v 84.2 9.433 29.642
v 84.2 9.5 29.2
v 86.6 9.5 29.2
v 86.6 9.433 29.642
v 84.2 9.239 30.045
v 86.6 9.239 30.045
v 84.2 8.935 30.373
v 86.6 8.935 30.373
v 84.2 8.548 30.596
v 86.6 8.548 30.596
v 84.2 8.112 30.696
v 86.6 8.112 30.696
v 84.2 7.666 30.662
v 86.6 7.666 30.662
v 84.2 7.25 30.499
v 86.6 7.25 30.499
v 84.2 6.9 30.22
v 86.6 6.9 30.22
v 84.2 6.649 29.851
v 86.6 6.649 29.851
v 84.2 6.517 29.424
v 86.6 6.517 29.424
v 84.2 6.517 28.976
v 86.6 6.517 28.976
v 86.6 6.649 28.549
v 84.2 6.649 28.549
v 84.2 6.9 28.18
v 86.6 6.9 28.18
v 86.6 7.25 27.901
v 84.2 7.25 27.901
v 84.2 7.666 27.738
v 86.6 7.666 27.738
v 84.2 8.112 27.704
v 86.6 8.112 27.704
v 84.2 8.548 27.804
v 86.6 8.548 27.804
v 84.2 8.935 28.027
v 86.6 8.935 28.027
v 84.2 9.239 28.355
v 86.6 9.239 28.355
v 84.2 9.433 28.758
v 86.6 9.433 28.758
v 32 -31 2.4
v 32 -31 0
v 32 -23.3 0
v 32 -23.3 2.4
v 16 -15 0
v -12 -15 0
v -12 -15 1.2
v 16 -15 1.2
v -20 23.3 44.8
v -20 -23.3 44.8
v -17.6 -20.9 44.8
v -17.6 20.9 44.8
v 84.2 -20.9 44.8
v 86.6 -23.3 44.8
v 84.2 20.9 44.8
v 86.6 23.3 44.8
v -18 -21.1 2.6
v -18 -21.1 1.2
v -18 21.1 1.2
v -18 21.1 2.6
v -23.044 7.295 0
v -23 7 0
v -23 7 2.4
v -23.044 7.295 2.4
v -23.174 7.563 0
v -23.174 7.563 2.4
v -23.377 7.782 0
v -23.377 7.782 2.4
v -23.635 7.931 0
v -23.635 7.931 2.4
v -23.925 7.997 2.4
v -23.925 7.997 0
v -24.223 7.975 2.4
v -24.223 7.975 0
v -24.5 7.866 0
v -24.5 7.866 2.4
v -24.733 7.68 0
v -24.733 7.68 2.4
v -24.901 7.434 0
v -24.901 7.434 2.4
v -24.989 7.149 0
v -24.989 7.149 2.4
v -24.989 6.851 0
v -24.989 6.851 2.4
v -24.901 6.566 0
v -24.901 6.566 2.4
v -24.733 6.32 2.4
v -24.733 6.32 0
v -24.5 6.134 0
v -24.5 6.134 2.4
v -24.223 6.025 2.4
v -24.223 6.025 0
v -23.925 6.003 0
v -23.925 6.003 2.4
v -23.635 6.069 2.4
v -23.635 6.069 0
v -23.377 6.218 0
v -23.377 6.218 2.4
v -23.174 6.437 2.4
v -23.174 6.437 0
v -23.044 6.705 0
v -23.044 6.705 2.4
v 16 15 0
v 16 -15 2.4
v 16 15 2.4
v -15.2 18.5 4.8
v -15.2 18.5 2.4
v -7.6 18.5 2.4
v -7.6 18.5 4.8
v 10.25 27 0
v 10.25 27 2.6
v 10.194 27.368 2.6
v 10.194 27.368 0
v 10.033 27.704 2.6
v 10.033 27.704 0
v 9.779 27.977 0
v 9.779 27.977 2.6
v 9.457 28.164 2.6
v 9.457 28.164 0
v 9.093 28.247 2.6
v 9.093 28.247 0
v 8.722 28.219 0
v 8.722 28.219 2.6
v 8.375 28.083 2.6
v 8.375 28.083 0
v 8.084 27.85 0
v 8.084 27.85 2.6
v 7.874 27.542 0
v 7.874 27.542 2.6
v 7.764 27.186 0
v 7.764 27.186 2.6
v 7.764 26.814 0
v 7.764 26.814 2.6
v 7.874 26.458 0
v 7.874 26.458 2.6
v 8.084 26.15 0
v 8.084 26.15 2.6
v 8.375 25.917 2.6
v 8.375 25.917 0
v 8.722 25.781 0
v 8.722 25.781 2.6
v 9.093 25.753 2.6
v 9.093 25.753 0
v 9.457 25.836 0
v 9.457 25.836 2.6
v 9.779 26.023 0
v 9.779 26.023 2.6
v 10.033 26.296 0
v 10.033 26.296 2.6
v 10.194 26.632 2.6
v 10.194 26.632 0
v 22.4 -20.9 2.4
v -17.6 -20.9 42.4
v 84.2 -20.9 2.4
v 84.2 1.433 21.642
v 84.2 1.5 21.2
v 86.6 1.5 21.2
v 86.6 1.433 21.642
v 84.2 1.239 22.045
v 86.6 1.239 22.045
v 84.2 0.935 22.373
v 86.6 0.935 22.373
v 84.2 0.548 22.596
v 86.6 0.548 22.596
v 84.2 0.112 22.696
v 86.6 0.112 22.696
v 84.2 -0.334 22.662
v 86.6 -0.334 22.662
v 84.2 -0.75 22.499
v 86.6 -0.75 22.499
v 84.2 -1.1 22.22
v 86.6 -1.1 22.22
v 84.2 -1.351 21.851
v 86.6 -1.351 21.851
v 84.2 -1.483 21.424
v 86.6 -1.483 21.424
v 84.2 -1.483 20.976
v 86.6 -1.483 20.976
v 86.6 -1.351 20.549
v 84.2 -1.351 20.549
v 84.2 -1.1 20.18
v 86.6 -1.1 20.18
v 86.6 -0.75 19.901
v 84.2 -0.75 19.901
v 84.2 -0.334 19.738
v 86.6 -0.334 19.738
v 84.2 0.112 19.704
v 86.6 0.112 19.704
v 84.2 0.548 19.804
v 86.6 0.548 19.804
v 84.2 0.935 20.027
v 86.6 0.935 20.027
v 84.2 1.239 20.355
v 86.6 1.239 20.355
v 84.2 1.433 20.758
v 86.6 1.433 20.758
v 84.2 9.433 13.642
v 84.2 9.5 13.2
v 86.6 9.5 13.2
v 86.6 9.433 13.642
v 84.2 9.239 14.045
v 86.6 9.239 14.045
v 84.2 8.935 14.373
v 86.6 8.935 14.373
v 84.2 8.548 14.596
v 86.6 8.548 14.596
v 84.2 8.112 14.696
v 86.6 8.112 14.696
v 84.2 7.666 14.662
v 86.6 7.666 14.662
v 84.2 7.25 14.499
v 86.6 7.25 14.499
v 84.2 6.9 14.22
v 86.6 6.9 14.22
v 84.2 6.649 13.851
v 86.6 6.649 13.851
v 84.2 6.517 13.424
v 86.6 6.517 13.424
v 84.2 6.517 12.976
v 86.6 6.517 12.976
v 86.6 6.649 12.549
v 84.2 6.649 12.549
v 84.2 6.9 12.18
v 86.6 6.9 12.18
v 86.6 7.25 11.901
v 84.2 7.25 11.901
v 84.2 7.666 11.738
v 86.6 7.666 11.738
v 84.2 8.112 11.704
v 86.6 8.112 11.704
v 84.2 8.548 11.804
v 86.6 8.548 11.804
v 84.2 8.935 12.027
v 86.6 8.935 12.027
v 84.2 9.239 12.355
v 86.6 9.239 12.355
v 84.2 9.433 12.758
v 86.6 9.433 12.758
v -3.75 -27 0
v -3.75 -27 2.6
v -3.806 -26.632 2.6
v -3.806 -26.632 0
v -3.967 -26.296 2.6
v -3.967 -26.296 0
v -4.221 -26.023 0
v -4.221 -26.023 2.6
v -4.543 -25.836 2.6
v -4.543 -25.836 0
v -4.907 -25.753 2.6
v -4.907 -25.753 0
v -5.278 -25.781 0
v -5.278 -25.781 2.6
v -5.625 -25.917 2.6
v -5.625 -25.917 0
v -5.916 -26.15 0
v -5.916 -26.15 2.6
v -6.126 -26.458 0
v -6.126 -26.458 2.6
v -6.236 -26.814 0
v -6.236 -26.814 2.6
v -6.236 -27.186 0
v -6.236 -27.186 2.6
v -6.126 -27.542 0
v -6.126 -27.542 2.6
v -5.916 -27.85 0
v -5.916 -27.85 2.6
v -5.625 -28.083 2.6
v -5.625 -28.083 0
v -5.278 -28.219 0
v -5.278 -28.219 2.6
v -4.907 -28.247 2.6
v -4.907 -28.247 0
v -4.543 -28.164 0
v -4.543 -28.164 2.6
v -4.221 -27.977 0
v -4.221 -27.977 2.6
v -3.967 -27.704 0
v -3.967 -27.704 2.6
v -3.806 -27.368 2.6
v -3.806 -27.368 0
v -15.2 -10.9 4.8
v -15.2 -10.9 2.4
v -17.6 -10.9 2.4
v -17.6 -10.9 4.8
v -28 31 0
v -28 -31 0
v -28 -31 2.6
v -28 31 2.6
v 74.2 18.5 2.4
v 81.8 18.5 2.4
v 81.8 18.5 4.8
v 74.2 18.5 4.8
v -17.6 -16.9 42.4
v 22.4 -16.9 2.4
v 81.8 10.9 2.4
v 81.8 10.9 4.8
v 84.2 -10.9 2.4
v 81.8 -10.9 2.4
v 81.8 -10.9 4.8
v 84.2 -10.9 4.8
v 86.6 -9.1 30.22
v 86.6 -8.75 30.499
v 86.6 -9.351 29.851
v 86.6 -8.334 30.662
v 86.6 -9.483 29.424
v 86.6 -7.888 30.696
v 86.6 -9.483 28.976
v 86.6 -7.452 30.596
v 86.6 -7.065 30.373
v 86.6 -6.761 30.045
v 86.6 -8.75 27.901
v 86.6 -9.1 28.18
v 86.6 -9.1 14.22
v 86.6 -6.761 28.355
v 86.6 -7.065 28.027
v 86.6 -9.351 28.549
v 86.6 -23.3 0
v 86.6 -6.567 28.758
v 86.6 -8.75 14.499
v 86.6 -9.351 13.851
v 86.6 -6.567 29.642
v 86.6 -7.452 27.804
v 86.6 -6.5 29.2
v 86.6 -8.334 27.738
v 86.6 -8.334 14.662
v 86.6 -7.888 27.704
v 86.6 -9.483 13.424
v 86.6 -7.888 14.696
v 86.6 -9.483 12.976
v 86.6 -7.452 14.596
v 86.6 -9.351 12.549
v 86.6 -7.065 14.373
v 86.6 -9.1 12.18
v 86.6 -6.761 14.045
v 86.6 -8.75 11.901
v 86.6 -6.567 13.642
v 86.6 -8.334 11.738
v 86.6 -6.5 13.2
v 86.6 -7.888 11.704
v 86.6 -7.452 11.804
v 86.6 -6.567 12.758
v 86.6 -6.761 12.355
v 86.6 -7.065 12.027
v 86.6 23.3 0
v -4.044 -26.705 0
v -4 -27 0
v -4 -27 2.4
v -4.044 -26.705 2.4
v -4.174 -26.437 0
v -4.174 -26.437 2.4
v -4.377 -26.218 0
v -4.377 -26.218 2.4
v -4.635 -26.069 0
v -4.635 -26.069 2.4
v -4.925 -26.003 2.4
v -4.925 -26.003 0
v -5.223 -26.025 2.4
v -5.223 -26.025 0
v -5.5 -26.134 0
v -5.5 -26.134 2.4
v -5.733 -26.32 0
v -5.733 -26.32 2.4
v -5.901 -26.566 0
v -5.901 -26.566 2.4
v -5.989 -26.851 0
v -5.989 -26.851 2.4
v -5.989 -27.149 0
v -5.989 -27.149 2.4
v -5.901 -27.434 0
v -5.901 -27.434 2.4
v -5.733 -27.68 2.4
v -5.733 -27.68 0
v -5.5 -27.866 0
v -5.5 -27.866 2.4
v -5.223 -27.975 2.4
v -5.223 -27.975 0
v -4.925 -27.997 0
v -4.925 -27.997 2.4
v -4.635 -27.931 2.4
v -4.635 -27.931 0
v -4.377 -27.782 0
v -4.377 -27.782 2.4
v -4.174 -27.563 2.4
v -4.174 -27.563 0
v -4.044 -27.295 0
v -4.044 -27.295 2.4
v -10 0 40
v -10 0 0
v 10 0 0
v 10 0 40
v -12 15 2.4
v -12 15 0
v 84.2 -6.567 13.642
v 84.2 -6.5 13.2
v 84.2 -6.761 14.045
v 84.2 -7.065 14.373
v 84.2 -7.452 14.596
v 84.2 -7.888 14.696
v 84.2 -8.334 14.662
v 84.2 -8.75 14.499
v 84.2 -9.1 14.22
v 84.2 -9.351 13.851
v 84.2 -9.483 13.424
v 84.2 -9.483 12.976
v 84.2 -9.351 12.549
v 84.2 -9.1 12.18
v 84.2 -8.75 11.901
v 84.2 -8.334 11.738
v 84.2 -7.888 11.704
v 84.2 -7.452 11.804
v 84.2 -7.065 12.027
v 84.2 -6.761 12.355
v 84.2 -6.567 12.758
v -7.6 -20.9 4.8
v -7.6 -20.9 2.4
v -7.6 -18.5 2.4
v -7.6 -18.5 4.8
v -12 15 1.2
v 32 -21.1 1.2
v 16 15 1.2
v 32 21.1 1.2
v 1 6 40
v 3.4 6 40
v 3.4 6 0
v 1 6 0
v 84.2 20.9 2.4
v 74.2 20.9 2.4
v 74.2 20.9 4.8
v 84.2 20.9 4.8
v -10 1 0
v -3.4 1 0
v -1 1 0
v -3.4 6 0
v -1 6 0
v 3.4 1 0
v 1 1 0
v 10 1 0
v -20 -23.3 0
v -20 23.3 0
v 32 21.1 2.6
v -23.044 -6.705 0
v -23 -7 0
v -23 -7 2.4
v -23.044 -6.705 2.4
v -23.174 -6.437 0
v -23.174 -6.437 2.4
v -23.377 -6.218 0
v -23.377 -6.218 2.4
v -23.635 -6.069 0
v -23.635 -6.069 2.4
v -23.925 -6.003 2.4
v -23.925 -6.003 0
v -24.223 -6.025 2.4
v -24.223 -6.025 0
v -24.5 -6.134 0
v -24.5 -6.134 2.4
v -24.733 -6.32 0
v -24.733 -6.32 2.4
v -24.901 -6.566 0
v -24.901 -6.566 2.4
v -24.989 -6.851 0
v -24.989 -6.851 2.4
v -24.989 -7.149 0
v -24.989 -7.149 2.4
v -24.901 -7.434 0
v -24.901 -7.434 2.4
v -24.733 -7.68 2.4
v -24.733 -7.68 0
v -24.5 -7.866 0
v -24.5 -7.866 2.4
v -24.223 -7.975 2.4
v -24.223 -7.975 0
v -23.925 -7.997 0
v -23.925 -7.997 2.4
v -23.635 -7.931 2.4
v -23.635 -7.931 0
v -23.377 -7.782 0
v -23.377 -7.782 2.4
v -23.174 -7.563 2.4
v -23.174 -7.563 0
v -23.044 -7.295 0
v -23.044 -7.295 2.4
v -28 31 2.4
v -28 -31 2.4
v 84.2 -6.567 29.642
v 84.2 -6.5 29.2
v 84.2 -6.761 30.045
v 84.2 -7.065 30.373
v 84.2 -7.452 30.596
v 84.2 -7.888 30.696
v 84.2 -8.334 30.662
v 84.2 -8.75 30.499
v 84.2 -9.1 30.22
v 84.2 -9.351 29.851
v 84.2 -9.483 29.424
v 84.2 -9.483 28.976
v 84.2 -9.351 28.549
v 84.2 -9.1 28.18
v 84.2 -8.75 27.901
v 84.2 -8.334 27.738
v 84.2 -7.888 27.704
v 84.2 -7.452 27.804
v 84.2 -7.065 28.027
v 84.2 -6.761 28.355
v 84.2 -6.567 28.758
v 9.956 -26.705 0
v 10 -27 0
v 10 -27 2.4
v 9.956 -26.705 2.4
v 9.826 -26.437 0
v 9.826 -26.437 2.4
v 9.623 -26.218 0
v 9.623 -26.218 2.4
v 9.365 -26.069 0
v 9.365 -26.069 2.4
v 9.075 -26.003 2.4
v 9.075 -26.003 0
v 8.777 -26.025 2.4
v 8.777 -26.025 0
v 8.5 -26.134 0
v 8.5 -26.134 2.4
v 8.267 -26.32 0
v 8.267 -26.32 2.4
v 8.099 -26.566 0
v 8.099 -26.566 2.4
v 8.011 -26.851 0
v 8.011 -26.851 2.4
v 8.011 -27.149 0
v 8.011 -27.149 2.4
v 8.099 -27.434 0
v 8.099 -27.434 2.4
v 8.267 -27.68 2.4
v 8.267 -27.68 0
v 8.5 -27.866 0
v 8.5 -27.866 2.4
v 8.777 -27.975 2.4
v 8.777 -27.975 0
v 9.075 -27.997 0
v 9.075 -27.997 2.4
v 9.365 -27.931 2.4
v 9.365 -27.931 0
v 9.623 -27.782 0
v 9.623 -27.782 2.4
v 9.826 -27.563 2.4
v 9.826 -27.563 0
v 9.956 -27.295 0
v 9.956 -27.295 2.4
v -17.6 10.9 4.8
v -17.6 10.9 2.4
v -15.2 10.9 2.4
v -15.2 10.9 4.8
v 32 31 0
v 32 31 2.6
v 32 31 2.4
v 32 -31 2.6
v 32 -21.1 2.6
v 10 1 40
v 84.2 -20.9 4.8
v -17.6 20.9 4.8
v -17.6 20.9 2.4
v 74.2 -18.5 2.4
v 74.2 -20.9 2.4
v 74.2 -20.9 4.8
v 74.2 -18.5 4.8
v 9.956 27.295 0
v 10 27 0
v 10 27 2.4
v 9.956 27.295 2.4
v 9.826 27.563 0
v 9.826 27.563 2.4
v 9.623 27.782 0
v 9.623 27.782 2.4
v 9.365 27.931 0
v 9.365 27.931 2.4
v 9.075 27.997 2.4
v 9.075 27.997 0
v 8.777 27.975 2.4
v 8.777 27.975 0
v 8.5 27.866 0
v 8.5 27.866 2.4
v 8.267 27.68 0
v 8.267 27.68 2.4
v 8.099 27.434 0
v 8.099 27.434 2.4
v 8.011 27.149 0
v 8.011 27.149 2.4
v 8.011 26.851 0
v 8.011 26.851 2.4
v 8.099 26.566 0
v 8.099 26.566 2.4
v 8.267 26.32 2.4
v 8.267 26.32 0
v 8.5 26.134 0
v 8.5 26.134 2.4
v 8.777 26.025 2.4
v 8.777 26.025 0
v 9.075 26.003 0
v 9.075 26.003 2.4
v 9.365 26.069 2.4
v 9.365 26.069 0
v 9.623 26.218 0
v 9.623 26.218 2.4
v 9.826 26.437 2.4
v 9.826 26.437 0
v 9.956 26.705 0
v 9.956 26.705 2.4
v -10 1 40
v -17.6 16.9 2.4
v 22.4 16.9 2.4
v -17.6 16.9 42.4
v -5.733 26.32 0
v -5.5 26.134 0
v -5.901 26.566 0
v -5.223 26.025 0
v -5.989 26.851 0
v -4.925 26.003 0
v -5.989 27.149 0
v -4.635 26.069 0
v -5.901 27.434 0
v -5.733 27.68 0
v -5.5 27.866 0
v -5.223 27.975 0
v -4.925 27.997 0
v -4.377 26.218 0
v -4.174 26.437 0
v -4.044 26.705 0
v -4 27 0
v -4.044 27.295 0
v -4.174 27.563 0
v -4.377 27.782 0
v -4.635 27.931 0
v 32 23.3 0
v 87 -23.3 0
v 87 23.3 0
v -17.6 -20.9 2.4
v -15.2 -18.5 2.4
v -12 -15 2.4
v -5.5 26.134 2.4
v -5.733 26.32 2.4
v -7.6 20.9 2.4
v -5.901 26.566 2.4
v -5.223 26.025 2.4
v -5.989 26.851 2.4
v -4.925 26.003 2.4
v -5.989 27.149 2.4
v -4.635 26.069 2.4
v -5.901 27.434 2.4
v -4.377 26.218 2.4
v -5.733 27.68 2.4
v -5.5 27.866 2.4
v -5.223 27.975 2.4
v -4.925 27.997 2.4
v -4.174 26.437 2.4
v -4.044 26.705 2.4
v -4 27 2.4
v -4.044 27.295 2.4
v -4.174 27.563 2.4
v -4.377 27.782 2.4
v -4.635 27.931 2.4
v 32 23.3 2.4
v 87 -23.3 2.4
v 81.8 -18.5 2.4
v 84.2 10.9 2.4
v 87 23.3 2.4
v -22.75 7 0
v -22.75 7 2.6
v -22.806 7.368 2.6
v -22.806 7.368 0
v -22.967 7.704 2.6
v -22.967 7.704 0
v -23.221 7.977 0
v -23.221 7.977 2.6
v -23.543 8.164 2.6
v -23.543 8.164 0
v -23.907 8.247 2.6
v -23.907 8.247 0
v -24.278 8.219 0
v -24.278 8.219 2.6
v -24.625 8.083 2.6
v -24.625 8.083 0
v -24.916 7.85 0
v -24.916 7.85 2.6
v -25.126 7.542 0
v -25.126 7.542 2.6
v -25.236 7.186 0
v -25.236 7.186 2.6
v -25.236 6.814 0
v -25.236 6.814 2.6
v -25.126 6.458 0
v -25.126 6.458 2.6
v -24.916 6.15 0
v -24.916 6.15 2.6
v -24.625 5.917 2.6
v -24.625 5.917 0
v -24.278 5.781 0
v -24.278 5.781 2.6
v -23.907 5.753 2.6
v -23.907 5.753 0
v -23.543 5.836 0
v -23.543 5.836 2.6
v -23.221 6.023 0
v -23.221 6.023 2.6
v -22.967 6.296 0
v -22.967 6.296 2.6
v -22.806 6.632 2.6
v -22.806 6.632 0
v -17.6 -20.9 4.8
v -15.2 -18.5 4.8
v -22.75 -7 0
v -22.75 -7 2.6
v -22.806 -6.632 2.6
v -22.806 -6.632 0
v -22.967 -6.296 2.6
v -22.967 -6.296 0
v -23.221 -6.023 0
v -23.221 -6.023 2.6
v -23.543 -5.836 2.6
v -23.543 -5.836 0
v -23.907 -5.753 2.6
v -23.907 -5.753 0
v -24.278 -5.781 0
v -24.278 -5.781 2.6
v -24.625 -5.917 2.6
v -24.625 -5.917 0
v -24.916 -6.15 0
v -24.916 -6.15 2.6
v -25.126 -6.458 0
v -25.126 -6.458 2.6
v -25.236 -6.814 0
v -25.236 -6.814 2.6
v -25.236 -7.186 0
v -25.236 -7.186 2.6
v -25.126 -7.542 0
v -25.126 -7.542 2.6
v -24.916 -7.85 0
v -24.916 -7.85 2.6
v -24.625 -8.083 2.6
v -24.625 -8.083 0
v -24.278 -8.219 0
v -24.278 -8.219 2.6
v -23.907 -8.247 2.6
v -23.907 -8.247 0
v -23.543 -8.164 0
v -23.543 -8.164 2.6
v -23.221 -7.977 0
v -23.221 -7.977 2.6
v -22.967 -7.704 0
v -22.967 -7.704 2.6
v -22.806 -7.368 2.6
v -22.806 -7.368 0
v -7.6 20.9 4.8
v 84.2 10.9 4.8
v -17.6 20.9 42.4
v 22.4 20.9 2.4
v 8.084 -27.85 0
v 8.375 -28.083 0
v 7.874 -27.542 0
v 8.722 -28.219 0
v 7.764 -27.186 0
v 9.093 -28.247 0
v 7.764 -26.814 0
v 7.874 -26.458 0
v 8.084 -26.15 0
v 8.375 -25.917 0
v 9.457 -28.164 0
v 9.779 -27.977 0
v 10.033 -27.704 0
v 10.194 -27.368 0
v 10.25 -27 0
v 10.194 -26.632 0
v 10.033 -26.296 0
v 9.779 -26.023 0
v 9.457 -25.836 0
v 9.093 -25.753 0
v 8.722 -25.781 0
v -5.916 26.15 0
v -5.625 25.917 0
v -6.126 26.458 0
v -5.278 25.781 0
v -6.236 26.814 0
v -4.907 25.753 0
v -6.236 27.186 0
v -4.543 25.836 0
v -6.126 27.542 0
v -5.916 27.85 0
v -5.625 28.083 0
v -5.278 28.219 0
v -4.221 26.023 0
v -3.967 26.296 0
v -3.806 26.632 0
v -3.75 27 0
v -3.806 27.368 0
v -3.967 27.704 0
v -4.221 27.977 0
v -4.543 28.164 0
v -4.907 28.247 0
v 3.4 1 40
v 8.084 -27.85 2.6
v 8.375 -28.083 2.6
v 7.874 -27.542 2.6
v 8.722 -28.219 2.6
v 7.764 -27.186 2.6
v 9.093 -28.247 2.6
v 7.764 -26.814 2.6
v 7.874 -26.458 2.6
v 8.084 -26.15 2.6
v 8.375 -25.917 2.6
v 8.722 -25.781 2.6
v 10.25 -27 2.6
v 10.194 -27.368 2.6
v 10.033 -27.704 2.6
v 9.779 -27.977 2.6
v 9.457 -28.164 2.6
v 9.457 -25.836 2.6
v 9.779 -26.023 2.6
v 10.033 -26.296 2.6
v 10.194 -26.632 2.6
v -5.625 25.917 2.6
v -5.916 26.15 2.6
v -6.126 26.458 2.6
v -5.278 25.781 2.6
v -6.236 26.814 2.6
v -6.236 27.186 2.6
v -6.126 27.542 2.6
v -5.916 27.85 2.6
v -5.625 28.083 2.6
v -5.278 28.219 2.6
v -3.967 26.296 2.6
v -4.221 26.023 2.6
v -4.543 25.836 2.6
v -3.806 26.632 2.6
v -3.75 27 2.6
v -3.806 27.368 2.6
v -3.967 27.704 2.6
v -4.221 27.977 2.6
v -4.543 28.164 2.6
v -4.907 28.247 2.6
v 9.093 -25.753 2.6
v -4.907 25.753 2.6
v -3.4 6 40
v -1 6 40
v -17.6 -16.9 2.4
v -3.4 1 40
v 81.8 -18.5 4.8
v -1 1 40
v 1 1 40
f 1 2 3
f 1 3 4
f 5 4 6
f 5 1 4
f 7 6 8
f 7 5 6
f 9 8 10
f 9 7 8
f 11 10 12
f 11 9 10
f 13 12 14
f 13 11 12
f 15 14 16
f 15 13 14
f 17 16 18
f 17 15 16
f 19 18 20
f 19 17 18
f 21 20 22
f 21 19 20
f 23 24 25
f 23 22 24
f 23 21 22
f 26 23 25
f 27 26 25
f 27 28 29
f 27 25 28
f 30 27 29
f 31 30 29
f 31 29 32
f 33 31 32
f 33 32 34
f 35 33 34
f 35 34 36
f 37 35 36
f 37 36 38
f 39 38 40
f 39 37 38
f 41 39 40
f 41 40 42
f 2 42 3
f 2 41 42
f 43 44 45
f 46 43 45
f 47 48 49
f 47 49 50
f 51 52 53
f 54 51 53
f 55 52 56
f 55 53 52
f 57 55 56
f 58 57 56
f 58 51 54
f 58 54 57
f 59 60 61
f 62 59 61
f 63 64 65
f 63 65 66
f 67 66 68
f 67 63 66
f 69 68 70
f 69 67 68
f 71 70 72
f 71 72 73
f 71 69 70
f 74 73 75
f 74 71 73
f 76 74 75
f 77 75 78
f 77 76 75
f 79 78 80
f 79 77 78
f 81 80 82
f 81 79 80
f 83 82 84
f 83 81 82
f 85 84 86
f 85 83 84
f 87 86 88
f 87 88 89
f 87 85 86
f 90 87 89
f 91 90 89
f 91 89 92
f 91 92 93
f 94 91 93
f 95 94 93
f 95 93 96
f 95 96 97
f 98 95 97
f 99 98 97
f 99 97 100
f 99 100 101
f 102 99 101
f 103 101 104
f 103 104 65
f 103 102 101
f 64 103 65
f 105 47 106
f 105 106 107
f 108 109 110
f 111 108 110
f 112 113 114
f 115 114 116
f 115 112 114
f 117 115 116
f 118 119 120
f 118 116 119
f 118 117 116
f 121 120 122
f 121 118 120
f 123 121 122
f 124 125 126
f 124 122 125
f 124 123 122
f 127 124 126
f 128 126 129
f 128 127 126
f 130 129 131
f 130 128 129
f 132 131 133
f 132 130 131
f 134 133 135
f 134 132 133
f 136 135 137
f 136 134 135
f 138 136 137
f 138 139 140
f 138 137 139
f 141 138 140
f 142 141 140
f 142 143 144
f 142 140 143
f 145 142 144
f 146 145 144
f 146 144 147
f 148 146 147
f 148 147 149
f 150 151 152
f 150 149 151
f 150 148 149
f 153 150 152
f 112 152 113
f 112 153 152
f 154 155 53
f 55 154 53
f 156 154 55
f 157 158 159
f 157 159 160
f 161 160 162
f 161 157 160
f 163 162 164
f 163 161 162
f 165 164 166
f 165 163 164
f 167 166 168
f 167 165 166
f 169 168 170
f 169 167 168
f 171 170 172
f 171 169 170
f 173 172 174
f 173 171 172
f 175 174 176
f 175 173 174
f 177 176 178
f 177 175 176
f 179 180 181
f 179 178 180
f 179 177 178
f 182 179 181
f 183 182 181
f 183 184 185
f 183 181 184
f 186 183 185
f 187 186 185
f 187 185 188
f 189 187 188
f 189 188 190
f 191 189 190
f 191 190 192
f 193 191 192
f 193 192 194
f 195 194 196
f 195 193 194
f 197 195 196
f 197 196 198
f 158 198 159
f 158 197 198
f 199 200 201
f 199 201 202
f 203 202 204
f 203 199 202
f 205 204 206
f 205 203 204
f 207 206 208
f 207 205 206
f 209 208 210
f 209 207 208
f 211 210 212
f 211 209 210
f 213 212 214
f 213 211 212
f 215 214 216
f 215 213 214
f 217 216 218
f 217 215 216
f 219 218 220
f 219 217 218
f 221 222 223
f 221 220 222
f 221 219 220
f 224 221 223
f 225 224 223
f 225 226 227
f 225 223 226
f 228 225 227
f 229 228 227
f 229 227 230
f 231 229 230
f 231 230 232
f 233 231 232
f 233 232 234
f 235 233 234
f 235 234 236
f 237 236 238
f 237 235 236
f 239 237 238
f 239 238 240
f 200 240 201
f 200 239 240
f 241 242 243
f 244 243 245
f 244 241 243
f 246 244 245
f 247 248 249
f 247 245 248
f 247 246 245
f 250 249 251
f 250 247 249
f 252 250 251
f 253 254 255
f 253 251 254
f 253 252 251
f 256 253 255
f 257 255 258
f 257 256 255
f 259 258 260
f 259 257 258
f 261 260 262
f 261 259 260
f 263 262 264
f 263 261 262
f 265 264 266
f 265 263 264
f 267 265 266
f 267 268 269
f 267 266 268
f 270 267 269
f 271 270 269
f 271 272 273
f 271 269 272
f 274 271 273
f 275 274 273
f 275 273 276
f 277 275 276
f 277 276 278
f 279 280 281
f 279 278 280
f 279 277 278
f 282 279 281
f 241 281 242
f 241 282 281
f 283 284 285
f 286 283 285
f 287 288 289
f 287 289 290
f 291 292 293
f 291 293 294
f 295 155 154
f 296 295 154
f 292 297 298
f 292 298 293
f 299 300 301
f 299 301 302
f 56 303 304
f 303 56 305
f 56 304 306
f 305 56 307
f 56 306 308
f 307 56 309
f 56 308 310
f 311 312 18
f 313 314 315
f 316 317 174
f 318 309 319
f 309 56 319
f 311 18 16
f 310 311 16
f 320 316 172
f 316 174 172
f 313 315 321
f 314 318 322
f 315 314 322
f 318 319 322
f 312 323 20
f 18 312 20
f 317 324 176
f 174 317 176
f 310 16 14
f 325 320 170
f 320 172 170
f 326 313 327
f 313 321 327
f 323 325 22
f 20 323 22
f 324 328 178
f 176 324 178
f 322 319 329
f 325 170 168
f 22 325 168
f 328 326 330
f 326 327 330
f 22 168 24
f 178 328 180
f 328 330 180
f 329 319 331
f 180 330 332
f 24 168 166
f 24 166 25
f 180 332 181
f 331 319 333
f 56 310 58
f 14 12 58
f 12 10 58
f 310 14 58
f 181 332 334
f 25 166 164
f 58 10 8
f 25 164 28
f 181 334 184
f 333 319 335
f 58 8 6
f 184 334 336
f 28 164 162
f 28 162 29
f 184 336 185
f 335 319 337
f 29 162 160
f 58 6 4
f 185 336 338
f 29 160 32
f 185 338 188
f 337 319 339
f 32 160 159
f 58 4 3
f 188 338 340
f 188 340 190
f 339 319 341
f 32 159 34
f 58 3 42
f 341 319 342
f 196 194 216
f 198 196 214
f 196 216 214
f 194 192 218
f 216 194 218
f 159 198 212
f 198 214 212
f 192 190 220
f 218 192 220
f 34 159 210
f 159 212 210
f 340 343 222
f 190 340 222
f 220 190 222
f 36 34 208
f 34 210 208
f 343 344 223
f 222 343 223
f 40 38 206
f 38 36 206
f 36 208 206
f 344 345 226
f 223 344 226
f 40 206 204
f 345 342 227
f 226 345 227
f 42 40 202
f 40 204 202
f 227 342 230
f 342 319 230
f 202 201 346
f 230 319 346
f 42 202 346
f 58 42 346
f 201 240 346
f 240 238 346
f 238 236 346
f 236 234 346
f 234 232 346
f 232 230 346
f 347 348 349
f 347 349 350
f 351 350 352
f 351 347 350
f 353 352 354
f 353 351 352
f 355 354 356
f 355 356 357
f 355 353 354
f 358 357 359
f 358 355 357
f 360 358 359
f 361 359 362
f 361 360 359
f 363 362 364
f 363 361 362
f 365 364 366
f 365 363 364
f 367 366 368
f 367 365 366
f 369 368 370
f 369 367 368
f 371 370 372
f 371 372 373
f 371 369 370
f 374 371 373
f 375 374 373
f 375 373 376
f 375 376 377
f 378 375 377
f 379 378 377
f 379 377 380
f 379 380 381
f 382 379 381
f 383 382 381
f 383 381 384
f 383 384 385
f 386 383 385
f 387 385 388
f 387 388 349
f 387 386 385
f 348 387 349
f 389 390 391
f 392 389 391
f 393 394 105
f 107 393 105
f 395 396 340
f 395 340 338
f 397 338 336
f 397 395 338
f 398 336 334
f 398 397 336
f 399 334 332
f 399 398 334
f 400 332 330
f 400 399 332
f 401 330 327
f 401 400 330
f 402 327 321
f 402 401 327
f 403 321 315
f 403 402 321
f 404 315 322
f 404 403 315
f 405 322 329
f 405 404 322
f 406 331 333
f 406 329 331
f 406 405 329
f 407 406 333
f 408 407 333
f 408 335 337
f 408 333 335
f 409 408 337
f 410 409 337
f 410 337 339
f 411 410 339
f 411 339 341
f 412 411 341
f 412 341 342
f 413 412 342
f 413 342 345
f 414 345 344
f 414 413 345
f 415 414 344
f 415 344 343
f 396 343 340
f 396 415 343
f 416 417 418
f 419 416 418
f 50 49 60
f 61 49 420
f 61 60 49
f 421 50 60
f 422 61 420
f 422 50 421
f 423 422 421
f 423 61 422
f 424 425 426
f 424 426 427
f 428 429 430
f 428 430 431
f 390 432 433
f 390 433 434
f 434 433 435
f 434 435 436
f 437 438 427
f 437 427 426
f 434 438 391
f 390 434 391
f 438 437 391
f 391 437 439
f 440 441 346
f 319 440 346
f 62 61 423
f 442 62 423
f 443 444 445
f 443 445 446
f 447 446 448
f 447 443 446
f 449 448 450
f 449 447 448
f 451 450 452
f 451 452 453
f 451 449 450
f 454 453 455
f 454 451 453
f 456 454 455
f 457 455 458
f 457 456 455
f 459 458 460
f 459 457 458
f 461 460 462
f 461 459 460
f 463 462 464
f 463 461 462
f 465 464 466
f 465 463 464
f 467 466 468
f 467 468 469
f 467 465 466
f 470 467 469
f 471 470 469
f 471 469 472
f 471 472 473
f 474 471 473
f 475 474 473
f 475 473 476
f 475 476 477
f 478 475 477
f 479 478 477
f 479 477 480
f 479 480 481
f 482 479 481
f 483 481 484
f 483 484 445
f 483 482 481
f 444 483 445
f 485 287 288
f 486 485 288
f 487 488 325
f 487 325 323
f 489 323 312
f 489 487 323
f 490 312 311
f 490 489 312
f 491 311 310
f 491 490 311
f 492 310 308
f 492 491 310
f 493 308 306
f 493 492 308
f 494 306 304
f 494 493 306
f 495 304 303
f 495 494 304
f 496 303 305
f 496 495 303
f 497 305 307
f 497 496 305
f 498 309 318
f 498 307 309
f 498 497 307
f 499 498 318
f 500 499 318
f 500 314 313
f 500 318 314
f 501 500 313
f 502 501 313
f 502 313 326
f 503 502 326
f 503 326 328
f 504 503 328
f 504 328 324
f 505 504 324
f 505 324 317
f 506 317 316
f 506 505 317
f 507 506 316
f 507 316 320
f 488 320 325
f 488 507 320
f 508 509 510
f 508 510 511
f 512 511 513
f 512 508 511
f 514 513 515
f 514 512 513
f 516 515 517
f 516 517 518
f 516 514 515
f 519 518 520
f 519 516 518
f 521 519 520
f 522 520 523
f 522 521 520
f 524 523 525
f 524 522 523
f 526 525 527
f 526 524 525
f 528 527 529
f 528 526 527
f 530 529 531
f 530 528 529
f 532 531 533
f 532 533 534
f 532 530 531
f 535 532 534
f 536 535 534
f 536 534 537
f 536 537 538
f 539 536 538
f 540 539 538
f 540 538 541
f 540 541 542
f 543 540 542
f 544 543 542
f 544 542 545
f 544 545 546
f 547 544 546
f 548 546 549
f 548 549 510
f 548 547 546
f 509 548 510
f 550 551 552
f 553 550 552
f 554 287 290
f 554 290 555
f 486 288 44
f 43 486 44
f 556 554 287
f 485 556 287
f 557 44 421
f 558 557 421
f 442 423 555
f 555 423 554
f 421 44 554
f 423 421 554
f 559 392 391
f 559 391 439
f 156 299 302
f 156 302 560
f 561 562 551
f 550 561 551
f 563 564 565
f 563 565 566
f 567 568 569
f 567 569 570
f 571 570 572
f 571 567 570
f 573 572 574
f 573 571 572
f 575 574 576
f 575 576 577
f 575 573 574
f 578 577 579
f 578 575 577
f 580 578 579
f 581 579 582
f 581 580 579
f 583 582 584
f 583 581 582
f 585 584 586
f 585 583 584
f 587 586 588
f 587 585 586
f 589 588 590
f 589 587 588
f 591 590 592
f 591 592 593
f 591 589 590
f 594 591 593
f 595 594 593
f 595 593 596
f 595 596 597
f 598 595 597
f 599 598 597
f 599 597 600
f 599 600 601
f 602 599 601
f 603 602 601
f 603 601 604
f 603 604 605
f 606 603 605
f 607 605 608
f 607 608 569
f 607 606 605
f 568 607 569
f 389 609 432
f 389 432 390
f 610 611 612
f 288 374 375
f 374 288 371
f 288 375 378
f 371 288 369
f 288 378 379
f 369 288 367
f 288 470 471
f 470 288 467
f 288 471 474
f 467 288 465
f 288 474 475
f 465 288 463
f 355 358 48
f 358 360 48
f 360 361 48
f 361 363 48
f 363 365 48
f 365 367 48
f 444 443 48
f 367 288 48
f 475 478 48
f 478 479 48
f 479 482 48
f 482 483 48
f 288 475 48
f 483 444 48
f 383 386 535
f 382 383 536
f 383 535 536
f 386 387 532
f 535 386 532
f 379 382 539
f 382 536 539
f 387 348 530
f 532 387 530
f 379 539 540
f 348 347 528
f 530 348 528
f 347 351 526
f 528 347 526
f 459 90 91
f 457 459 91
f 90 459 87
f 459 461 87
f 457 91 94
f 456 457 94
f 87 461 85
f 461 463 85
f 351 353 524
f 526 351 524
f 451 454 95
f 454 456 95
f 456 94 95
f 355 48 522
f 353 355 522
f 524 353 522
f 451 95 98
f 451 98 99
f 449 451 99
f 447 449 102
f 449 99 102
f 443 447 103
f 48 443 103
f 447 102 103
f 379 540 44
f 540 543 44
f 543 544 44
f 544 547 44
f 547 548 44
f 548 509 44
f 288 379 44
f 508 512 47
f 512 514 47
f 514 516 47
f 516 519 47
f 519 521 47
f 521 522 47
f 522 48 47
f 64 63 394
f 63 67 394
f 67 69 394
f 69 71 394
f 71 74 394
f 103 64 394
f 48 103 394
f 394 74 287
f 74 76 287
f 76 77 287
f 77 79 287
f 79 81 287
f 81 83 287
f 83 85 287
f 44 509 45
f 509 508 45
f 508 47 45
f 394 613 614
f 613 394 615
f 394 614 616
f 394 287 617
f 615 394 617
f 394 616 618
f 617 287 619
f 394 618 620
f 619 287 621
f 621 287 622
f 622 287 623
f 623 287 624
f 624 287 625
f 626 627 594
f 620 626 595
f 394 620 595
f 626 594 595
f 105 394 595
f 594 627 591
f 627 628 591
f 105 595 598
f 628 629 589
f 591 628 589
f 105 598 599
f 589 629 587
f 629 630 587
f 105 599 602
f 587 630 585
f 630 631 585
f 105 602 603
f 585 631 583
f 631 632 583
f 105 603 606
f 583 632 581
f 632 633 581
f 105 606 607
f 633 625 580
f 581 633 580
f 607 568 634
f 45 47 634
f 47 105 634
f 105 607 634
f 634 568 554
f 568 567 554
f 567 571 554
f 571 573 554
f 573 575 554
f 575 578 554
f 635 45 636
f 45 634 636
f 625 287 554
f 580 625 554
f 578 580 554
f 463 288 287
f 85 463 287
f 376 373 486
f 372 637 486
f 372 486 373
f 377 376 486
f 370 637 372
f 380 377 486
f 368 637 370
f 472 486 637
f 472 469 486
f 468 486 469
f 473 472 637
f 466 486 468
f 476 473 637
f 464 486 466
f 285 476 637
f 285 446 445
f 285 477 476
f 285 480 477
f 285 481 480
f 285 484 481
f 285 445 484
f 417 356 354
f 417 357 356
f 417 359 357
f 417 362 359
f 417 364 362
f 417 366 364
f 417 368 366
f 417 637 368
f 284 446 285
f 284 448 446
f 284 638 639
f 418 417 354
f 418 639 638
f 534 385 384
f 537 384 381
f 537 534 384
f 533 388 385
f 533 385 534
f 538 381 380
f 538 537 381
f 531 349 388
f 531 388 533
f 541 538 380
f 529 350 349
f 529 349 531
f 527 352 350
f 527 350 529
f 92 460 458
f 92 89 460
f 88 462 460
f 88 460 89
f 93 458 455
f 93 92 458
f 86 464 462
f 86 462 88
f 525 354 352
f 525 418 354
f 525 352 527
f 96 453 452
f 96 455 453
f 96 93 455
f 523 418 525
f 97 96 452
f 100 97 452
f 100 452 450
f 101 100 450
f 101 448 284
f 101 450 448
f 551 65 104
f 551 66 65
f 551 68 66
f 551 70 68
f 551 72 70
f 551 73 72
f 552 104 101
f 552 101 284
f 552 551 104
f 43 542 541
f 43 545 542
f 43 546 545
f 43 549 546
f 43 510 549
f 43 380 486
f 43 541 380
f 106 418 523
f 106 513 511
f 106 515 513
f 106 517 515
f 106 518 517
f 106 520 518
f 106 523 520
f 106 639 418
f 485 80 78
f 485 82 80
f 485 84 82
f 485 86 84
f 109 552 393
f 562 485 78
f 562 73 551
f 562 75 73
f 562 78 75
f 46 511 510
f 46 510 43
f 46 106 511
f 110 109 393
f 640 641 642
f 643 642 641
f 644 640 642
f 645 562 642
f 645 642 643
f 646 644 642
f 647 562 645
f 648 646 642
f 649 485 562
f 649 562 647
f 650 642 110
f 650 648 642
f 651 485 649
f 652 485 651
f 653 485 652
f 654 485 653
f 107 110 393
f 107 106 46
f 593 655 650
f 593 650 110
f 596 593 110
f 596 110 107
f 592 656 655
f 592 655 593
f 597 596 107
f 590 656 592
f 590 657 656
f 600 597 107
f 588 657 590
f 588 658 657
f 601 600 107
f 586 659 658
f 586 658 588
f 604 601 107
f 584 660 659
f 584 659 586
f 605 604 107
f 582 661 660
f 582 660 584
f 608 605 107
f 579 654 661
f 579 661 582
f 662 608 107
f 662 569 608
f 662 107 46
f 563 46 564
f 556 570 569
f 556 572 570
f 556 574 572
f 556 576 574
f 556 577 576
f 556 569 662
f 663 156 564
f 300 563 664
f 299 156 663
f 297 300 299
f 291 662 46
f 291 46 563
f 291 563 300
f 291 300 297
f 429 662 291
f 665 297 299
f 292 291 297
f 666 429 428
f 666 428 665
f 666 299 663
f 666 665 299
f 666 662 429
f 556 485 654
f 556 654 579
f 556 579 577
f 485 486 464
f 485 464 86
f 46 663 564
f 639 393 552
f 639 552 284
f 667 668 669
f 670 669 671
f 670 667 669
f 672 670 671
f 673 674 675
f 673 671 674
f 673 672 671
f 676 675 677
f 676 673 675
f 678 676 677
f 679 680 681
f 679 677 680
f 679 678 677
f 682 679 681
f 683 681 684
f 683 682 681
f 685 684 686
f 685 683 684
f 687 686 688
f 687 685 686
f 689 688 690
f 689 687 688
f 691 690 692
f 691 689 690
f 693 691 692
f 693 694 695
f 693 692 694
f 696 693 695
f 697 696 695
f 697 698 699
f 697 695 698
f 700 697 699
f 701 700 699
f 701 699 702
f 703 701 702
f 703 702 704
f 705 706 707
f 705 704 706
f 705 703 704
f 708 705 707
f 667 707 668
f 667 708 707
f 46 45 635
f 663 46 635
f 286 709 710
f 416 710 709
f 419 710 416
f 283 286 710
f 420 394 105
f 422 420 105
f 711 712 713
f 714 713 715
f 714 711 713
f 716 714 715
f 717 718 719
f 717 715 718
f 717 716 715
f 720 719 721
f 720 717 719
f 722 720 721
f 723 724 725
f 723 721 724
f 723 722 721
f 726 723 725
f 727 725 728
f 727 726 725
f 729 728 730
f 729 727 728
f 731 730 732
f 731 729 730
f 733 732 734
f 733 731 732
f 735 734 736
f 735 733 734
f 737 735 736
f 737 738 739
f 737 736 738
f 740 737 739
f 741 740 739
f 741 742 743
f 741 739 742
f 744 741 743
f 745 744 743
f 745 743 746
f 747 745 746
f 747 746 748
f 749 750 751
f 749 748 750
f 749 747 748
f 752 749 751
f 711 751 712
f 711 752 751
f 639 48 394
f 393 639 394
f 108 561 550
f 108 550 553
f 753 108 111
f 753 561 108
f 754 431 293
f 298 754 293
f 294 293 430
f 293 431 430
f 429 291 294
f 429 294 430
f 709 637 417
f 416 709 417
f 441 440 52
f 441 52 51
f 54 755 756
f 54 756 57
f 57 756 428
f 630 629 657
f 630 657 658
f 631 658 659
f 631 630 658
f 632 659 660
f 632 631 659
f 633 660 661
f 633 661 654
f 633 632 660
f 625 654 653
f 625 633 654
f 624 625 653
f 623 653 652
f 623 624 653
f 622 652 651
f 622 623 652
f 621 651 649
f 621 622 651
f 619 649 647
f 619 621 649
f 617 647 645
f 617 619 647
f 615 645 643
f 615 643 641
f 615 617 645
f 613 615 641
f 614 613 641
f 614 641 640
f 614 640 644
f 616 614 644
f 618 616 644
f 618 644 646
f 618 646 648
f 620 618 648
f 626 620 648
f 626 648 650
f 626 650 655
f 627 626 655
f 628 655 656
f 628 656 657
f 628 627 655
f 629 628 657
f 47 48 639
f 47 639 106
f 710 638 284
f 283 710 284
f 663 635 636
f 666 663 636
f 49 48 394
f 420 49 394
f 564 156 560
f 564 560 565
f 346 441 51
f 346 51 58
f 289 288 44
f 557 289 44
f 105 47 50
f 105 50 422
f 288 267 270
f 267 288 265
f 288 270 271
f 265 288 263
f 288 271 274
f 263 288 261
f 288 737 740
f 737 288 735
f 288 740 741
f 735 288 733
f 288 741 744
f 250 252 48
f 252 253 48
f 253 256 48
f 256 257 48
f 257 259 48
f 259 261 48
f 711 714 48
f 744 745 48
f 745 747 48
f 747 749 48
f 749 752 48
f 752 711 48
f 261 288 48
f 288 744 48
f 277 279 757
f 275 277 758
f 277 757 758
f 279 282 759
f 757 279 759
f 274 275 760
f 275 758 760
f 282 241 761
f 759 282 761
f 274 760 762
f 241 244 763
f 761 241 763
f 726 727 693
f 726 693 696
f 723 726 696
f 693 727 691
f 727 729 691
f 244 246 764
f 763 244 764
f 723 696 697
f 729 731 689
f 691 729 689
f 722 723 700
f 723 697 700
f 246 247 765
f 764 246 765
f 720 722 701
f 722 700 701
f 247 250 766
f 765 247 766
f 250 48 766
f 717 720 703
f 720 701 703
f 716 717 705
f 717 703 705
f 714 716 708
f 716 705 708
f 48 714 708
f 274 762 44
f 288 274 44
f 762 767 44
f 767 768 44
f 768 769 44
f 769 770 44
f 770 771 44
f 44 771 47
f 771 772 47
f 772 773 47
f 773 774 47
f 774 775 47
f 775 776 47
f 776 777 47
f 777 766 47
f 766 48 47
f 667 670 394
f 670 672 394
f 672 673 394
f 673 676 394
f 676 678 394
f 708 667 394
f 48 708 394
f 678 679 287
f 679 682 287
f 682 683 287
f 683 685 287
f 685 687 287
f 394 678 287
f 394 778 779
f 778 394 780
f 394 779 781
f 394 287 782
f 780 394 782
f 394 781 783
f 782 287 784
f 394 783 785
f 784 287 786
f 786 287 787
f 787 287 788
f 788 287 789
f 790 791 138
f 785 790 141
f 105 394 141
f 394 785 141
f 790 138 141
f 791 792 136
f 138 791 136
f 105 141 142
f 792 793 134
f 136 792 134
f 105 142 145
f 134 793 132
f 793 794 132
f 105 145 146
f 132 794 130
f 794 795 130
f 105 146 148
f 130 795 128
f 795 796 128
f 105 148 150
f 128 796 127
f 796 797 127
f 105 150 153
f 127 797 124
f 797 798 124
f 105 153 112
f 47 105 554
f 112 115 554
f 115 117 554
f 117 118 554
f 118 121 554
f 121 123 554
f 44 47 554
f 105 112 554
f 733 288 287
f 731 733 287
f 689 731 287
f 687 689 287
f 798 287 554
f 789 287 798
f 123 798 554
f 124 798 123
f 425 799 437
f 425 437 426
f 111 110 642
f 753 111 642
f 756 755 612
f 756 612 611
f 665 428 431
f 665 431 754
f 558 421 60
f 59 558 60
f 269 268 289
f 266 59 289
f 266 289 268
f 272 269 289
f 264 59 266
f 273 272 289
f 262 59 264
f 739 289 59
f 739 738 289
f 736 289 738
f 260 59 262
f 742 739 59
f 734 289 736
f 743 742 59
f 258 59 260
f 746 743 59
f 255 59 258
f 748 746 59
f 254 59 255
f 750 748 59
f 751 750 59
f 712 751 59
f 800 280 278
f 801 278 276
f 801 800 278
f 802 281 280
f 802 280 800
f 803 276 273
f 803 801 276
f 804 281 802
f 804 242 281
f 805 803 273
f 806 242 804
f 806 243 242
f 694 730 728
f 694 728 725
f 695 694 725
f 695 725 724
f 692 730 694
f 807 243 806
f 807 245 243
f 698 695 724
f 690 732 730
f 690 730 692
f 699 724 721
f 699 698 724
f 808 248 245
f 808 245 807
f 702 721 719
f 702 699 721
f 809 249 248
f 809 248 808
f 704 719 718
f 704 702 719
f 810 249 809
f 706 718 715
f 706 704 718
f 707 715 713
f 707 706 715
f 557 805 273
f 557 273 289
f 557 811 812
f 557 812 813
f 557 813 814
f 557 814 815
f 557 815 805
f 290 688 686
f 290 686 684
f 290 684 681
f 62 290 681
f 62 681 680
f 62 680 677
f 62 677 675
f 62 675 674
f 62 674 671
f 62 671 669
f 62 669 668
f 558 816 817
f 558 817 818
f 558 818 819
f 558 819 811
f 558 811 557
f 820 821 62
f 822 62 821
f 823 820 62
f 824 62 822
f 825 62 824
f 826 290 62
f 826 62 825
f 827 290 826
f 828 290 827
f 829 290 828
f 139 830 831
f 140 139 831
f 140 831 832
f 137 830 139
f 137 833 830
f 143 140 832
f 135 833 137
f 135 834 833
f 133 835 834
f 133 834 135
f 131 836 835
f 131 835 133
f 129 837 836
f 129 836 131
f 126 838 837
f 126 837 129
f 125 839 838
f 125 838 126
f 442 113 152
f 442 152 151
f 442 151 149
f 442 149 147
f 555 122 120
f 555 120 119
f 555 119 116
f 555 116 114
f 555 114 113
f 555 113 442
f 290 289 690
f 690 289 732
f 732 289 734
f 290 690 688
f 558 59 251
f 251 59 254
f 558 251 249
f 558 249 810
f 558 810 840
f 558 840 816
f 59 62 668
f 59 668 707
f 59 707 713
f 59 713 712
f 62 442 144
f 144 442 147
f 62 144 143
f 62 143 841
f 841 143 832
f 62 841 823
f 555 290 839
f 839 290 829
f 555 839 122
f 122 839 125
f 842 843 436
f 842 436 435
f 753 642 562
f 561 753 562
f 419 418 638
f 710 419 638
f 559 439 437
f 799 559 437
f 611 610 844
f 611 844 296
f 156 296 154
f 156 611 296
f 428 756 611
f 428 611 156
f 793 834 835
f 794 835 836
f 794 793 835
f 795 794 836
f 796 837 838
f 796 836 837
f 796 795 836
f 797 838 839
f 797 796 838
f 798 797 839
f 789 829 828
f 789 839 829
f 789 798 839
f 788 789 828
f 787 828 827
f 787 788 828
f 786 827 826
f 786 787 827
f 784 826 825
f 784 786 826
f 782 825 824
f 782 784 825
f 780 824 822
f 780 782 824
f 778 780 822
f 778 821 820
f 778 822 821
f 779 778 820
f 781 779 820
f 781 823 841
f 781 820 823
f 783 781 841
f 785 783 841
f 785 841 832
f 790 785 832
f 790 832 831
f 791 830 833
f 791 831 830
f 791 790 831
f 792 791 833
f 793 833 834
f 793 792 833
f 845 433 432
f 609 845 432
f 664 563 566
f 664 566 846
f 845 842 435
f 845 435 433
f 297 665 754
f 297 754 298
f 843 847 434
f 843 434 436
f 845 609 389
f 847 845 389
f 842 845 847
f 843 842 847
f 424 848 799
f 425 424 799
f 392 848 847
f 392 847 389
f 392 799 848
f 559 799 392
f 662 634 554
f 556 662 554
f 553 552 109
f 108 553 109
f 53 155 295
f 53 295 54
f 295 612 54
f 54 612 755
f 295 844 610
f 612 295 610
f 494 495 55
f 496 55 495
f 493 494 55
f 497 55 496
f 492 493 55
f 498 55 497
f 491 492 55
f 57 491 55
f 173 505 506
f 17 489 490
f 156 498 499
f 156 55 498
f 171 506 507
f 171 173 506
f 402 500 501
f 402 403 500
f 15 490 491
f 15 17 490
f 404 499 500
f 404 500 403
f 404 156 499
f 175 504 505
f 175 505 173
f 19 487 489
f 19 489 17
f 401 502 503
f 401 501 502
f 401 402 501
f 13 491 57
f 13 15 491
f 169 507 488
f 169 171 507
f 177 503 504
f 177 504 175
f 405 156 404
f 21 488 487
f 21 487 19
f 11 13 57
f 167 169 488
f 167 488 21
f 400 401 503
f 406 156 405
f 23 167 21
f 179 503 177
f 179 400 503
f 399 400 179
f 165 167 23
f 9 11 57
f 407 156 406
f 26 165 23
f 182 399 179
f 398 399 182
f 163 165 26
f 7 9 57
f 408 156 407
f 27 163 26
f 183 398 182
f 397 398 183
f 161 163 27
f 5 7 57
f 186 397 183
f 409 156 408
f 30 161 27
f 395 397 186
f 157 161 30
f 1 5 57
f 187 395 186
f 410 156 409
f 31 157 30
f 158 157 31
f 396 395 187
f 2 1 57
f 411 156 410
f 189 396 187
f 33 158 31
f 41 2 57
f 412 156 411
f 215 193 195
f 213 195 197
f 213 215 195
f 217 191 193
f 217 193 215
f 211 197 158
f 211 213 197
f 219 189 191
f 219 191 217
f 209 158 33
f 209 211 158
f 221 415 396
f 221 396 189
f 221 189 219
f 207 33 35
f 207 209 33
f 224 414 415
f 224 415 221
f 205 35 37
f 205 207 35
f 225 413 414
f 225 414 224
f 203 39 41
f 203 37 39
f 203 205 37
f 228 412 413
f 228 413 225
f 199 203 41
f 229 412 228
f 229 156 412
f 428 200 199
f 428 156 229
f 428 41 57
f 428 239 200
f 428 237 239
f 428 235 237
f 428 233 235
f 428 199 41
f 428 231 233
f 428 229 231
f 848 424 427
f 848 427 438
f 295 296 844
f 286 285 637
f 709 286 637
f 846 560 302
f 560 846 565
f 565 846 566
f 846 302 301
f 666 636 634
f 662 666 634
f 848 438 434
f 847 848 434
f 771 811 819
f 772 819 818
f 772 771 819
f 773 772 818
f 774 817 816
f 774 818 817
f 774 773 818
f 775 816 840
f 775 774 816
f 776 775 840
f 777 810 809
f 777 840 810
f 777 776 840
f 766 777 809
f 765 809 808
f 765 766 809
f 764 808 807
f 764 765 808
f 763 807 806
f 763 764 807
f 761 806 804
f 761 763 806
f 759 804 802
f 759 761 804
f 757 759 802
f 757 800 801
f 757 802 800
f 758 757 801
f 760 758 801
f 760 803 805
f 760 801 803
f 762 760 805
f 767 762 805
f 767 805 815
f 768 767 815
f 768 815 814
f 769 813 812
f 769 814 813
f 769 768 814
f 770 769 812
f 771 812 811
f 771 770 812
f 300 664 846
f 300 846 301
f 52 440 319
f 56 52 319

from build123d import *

# Parameters (mm, degrees)
SKETCH_W             = 106.6
SKETCH_H             = 46.6
PAD_DEPTH            = 2.4
SKETCH001_W          = 106.6
SKETCH001_H          = 46.6
SKETCH001_W_2        = 101.8
SKETCH001_H_2        = 41.8
PAD001_DEPTH         = 44.8
PAD002_DEPTH         = 4
SKETCH003_R          = 1.5
POCKET_DEPTH         = 86.601
PAD003_DEPTH         = 40
SKETCH005_R          = 1
SKETCH005_W          = 28
SKETCH005_H          = 30
PAD005_DEPTH         = 2.4
PAD006_DEPTH         = 4.8
SKETCH007_W          = 60
SKETCH007_H          = 62
SKETCH007_R          = 1.25
SKETCH007_W_2        = 28
SKETCH007_H_2        = 30
PAD007_DEPTH         = 1.2
PAD008_DEPTH         = 2.6
SKETCH009_R          = 1.25
POCKET001_DEPTH      = 0.001
POCKET001_DEPTH_BACK = 2.601


with BuildPart() as box:
    # Sketch → Pad (new body)
    with BuildSketch(Plane.XY):
        with Locations((33.3, 0)):
            Rectangle(SKETCH_W, SKETCH_H)
    extrude(amount=PAD_DEPTH)

    # Sketch001 → Pad001 (join)
    with BuildSketch(Plane.XY):
        with Locations((33.3, 0)):
            Rectangle(SKETCH001_W, SKETCH001_H)
        with Locations((33.3, 0)):
            Rectangle(SKETCH001_W_2, SKETCH001_H_2, mode=Mode.SUBTRACT)
    extrude(amount=PAD001_DEPTH)

    # Sketch002 → Pad002 (join)
    with BuildSketch(Plane.XZ.offset(20.9)):
        Polygon((-17.6, 42.4), (22.4, 2.4), (-17.6, 2.4), align=None)
    pad002 = extrude(amount=-PAD002_DEPTH)

    # Mirrored: Pad002 across XZ
    add(pad002.mirror(Plane.XZ))

    # Sketch003 → Pocket (cut, through all)
    with BuildSketch(Plane.YZ):
        with Locations((0, 21.2)):
            Circle(SKETCH003_R)
        with Locations((-8, 13.2)):
            Circle(SKETCH003_R)
        with Locations((8, 29.2)):
            Circle(SKETCH003_R)
        with Locations((-8, 29.2)):
            Circle(SKETCH003_R)
        with Locations((8, 13.2)):
            Circle(SKETCH003_R)
    extrude(amount=POCKET_DEPTH, mode=Mode.SUBTRACT)


with BuildPart() as paper_holder:
    # Sketch004 → Pad003 (new body)
    with BuildSketch(Plane.XY):
        Polygon((-10, 0), (10, 0), (10, 1), (3.4, 1), (3.4, 6), (1, 6), (1, 1), (-1, 1), (-1, 6), (-3.4, 6), (-3.4, 1), (-10, 1), align=None)
    extrude(amount=PAD003_DEPTH)


with BuildPart() as lid:
    # Sketch005 → Pad005 (new body)
    with BuildSketch(Plane.XY):
        Polygon((87, -23.3), (87, 23.3), (32, 23.3), (32, 31), (-28, 31), (-28, -31), (32, -31), (32, -23.3), align=None)
        with Locations((-5, 27)):
            Circle(SKETCH005_R, mode=Mode.SUBTRACT)
        with Locations((9, 27)):
            Circle(SKETCH005_R, mode=Mode.SUBTRACT)
        with Locations((-5, -27)):
            Circle(SKETCH005_R, mode=Mode.SUBTRACT)
        with Locations((9, -27)):
            Circle(SKETCH005_R, mode=Mode.SUBTRACT)
        with Locations((-24, 7)):
            Circle(SKETCH005_R, mode=Mode.SUBTRACT)
        with Locations((-24, -7)):
            Circle(SKETCH005_R, mode=Mode.SUBTRACT)
        with Locations((2, 0)):
            Rectangle(SKETCH005_W, SKETCH005_H, mode=Mode.SUBTRACT)
    extrude(amount=PAD005_DEPTH)

    # Sketch006 → Pad006 (join)
    with BuildSketch(Plane.XY):
        Polygon((-7.6, 20.9), (-17.6, 20.9), (-17.6, 10.9), (-15.2, 10.9), (-15.2, 18.5), (-7.6, 18.5), align=None)
        Polygon((74.2, 20.9), (84.2, 20.9), (84.2, 10.9), (81.8, 10.9), (81.8, 18.5), (74.2, 18.5), align=None)
        Polygon((84.2, -10.9), (84.2, -20.9), (74.2, -20.9), (74.2, -18.5), (81.8, -18.5), (81.8, -10.9), align=None)
        Polygon((-17.6, -10.9), (-17.6, -20.9), (-7.6, -20.9), (-7.6, -18.5), (-15.2, -18.5), (-15.2, -10.9), align=None)
    extrude(amount=PAD006_DEPTH)


with BuildPart() as lid_top:
    # Sketch007 → Pad007 (new body)
    with BuildSketch(Plane.XY):
        with Locations((2, 0)):
            Rectangle(SKETCH007_W, SKETCH007_H)
        with Locations((-5, 27)):
            Circle(SKETCH007_R, mode=Mode.SUBTRACT)
        with Locations((9, 27)):
            Circle(SKETCH007_R, mode=Mode.SUBTRACT)
        with Locations((-5, -27)):
            Circle(SKETCH007_R, mode=Mode.SUBTRACT)
        with Locations((9, -27)):
            Circle(SKETCH007_R, mode=Mode.SUBTRACT)
        with Locations((-24, 7)):
            Circle(SKETCH007_R, mode=Mode.SUBTRACT)
        with Locations((-24, -7)):
            Circle(SKETCH007_R, mode=Mode.SUBTRACT)
        with Locations((2, 0)):
            Rectangle(SKETCH007_W_2, SKETCH007_H_2, mode=Mode.SUBTRACT)
    extrude(amount=PAD007_DEPTH)

    # Sketch008 → Pad008 (join)
    with BuildSketch(Plane.XY):
        Polygon((-28, 31), (-28, -31), (32, -31), (32, -21.1), (-18, -21.1), (-18, 21.1), (32, 21.1), (32, 31), align=None)
    extrude(amount=PAD008_DEPTH)

    # Sketch009 → Pocket001 (cut, two sides)
    with BuildSketch(Plane.XY) as pocket001_sk:
        with Locations((-5, 27)):
            Circle(SKETCH009_R)
        with Locations((9, 27)):
            Circle(SKETCH009_R)
        with Locations((-5, -27)):
            Circle(SKETCH009_R)
        with Locations((9, -27)):
            Circle(SKETCH009_R)
        with Locations((-24, 7)):
            Circle(SKETCH009_R)
        with Locations((-24, -7)):
            Circle(SKETCH009_R)
    extrude(amount=-POCKET001_DEPTH, mode=Mode.SUBTRACT)
    extrude(pocket001_sk.sketch, amount=POCKET001_DEPTH_BACK, mode=Mode.SUBTRACT)


solid = Compound([box.part, paper_holder.part, lid.part, lid_top.part])
